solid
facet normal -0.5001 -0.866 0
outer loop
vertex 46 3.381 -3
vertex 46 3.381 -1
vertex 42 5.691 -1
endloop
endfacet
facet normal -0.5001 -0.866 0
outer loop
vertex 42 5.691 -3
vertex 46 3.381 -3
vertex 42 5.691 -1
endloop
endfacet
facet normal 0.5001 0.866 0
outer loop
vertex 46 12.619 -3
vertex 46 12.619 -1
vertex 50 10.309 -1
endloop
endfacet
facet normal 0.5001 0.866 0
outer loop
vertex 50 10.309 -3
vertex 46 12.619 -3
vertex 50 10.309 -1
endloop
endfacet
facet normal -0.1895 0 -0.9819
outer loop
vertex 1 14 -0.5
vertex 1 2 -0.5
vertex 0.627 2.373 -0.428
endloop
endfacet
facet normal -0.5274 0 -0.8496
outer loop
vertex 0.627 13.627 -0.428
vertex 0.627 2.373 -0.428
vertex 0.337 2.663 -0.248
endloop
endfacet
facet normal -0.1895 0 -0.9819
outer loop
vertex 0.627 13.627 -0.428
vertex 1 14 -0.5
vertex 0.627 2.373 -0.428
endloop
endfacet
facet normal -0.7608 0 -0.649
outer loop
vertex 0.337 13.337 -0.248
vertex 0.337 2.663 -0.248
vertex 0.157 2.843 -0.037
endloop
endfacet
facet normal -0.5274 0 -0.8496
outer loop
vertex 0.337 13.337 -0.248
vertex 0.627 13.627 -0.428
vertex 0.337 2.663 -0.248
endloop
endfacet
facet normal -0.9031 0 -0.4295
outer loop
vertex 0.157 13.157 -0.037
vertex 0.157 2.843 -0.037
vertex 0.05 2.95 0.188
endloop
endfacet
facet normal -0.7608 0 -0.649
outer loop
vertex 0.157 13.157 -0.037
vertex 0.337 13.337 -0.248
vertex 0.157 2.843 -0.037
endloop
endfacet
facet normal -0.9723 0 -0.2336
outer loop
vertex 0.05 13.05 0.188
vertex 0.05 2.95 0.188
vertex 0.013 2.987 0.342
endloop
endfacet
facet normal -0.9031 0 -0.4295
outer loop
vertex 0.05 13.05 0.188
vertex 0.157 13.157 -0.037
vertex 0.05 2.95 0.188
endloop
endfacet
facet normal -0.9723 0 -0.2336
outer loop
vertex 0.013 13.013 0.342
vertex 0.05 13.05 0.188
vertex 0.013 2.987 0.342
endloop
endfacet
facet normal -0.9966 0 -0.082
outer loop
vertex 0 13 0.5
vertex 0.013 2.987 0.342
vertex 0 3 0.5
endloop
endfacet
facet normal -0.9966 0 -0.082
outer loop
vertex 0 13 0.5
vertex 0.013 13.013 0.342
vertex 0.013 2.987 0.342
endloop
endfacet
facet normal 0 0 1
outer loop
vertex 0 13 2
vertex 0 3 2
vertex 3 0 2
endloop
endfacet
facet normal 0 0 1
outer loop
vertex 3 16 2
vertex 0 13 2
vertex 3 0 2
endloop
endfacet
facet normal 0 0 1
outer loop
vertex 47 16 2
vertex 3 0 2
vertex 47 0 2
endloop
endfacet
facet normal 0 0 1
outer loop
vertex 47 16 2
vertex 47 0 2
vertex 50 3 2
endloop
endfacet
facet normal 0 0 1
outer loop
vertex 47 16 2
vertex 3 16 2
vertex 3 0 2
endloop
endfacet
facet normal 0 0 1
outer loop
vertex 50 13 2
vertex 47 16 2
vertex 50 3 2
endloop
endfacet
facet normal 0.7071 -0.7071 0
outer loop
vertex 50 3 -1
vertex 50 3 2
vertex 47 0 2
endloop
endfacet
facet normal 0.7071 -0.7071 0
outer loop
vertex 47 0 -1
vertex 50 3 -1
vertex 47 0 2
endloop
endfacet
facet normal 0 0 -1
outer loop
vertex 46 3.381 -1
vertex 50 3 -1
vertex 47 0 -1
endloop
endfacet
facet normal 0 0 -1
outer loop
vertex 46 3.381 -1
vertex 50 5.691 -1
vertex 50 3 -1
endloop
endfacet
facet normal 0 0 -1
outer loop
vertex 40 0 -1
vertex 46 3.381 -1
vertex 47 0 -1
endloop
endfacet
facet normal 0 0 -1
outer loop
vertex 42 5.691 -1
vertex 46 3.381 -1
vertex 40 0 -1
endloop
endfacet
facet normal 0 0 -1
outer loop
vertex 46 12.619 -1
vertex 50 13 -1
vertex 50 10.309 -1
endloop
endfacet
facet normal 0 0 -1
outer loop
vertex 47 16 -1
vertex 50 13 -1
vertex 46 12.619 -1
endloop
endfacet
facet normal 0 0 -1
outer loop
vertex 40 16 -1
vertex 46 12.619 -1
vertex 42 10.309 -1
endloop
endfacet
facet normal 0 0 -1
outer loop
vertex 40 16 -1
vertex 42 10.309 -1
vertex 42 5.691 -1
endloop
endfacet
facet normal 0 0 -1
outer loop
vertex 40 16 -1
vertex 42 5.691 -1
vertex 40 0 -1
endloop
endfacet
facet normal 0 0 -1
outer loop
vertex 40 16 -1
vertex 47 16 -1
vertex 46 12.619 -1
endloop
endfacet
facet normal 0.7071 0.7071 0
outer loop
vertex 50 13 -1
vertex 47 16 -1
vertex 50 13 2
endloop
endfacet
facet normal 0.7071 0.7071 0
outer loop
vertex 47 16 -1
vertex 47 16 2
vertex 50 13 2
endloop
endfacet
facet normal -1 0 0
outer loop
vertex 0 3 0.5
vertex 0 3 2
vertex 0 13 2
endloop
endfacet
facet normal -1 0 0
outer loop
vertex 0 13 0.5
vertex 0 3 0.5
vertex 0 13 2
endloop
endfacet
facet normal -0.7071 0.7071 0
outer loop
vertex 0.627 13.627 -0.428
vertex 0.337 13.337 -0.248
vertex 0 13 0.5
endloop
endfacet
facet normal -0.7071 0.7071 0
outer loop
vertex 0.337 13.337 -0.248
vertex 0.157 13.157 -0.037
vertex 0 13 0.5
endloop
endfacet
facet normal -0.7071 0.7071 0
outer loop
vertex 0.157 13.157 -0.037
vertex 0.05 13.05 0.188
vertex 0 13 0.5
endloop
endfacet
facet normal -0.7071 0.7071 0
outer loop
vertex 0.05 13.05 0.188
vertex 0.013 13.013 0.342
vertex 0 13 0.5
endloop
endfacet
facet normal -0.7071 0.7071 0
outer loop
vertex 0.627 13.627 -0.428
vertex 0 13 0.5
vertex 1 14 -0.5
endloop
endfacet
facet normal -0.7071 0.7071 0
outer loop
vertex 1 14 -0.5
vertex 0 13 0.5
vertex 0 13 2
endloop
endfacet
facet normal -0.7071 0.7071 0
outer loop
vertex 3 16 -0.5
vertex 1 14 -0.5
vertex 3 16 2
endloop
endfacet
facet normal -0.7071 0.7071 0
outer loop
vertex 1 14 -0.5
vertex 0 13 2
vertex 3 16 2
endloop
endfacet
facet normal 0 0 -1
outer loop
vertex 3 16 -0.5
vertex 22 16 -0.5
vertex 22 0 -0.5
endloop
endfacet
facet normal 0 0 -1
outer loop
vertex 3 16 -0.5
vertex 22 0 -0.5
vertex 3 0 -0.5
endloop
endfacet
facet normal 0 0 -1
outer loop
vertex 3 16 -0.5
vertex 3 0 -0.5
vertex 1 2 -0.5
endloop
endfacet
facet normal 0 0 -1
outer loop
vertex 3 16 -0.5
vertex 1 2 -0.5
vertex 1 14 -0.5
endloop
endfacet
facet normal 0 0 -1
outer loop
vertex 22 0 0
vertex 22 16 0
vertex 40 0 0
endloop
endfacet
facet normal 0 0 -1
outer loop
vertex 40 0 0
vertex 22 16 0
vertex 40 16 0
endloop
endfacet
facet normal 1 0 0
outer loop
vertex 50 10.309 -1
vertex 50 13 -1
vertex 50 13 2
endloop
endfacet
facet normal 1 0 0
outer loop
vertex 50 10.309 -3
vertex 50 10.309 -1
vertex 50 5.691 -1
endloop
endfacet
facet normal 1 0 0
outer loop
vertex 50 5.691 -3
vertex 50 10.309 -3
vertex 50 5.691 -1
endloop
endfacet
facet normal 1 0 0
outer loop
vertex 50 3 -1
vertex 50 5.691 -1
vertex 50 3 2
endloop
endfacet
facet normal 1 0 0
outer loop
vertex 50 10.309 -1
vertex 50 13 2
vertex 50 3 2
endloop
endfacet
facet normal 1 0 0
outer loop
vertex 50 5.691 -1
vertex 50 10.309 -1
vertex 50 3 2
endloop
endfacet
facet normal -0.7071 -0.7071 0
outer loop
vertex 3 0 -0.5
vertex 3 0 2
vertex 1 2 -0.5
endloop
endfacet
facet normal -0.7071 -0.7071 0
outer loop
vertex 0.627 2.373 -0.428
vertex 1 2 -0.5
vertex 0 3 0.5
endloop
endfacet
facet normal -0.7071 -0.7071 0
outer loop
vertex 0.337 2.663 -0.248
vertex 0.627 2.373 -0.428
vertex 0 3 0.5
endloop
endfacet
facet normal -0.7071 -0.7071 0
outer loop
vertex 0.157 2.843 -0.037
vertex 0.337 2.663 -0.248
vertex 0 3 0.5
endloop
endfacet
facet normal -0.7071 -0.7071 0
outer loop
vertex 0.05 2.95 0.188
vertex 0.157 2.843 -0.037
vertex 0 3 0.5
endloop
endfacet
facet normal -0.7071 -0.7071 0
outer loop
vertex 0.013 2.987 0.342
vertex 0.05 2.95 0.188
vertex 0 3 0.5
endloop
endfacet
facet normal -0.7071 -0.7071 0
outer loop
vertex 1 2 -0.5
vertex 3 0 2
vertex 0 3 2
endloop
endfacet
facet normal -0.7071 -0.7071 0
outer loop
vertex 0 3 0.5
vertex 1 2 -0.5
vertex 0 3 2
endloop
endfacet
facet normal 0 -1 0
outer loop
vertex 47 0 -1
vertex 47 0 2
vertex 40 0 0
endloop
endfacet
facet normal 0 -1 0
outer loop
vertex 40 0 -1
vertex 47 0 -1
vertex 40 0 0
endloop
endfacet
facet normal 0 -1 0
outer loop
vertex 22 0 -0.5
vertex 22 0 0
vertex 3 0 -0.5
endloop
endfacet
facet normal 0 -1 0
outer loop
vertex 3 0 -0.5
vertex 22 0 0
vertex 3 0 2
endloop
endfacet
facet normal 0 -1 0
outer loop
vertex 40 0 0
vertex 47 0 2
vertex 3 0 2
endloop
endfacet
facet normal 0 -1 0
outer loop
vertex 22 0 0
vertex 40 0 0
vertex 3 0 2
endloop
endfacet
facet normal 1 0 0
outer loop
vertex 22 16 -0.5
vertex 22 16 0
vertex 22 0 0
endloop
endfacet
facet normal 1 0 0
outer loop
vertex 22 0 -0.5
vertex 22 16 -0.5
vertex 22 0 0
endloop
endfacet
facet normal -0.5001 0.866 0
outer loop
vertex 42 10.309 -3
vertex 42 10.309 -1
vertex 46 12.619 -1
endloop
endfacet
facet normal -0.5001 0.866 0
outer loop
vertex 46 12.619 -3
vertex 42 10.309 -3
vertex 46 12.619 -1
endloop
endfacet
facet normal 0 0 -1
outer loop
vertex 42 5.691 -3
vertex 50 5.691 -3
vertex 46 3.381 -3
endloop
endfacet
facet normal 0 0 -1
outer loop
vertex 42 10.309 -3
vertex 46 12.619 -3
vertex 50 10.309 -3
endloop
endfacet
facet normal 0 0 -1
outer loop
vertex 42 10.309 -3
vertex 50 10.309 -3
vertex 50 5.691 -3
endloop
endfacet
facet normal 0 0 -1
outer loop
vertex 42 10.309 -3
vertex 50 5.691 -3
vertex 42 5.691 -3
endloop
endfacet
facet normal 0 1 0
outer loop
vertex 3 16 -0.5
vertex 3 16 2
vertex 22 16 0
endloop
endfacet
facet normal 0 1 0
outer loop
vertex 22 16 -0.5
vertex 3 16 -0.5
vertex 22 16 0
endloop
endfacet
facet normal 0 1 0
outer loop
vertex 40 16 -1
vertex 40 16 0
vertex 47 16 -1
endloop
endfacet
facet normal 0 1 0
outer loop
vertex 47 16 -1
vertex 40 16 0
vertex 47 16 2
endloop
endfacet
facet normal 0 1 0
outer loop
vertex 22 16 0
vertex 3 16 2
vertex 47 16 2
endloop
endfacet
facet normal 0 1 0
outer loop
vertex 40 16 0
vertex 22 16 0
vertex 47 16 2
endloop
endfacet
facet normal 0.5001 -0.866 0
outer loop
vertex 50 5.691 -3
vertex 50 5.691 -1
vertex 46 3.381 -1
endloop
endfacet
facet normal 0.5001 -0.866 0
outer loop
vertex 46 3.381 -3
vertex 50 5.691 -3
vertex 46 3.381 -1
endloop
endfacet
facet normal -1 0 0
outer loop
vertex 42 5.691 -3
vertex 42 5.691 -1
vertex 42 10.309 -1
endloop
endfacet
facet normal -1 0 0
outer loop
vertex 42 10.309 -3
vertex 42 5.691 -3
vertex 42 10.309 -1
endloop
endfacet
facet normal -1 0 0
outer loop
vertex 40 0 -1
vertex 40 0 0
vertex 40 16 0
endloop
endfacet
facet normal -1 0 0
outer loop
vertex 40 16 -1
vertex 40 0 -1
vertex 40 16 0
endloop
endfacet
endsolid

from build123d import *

# Parameters (mm, degrees)
EXTRUDE_1_DEPTH = 2
EXTRUDE_3_DEPTH = 0.5
FILLET_1_R      = 1
EXTRUDE_4_DEPTH = 1
EXTRUDE_5_DEPTH = 2


with BuildPart() as part:
    # 스케치1 → 보스-돌출1 (new body)
    with BuildSketch(Plane.XY):
        Polygon((3, 16), (0, 13), (0, 3), (3, 0), (47, 0), (50, 3), (50, 13), (47, 16), align=None)
    extrude(amount=EXTRUDE_1_DEPTH)

    # 스케치3 → 보스-돌출3 (add)
    with BuildSketch(Plane(origin=(0, 0, 0), x_dir=(-1, 0, 0), z_dir=(0, 0, -1))):
        Polygon((0, 13), (-3, 16), (-22, 16), (-22, 0), (-3, 0), (0, 3), align=None)
    extrude(amount=EXTRUDE_3_DEPTH)

    # 필렛1
    fillet_1_edges = [part.edges().sort_by_distance(p)[0] for p in [
        (0, 8, -0.5),
    ]]
    fillet(fillet_1_edges, radius=FILLET_1_R)

    # 스케치2 → 보스-돌출4 (add)
    with BuildSketch(Plane(origin=(0, 0, 0), x_dir=(-1, 0, 0), z_dir=(0, 0, -1))):
        Polygon((-47, 0), (-40, 0), (-40, 16), (-47, 16), (-50, 13), (-50, 3), align=None)
    extrude(amount=EXTRUDE_4_DEPTH)

    # 스케치4 → 보스-돌출5 (add)
    with BuildSketch(Plane(origin=(0, 0, -1), x_dir=(-1, 0, 0), z_dir=(0, 0, -1))):
        Polygon((-46, 12.618802154), (-50, 10.309401077), (-50, 5.690598923), (-46, 3.381197846), (-42, 5.690598923), (-42, 10.309401077), align=None)
    extrude(amount=EXTRUDE_5_DEPTH)


solid = part.part
